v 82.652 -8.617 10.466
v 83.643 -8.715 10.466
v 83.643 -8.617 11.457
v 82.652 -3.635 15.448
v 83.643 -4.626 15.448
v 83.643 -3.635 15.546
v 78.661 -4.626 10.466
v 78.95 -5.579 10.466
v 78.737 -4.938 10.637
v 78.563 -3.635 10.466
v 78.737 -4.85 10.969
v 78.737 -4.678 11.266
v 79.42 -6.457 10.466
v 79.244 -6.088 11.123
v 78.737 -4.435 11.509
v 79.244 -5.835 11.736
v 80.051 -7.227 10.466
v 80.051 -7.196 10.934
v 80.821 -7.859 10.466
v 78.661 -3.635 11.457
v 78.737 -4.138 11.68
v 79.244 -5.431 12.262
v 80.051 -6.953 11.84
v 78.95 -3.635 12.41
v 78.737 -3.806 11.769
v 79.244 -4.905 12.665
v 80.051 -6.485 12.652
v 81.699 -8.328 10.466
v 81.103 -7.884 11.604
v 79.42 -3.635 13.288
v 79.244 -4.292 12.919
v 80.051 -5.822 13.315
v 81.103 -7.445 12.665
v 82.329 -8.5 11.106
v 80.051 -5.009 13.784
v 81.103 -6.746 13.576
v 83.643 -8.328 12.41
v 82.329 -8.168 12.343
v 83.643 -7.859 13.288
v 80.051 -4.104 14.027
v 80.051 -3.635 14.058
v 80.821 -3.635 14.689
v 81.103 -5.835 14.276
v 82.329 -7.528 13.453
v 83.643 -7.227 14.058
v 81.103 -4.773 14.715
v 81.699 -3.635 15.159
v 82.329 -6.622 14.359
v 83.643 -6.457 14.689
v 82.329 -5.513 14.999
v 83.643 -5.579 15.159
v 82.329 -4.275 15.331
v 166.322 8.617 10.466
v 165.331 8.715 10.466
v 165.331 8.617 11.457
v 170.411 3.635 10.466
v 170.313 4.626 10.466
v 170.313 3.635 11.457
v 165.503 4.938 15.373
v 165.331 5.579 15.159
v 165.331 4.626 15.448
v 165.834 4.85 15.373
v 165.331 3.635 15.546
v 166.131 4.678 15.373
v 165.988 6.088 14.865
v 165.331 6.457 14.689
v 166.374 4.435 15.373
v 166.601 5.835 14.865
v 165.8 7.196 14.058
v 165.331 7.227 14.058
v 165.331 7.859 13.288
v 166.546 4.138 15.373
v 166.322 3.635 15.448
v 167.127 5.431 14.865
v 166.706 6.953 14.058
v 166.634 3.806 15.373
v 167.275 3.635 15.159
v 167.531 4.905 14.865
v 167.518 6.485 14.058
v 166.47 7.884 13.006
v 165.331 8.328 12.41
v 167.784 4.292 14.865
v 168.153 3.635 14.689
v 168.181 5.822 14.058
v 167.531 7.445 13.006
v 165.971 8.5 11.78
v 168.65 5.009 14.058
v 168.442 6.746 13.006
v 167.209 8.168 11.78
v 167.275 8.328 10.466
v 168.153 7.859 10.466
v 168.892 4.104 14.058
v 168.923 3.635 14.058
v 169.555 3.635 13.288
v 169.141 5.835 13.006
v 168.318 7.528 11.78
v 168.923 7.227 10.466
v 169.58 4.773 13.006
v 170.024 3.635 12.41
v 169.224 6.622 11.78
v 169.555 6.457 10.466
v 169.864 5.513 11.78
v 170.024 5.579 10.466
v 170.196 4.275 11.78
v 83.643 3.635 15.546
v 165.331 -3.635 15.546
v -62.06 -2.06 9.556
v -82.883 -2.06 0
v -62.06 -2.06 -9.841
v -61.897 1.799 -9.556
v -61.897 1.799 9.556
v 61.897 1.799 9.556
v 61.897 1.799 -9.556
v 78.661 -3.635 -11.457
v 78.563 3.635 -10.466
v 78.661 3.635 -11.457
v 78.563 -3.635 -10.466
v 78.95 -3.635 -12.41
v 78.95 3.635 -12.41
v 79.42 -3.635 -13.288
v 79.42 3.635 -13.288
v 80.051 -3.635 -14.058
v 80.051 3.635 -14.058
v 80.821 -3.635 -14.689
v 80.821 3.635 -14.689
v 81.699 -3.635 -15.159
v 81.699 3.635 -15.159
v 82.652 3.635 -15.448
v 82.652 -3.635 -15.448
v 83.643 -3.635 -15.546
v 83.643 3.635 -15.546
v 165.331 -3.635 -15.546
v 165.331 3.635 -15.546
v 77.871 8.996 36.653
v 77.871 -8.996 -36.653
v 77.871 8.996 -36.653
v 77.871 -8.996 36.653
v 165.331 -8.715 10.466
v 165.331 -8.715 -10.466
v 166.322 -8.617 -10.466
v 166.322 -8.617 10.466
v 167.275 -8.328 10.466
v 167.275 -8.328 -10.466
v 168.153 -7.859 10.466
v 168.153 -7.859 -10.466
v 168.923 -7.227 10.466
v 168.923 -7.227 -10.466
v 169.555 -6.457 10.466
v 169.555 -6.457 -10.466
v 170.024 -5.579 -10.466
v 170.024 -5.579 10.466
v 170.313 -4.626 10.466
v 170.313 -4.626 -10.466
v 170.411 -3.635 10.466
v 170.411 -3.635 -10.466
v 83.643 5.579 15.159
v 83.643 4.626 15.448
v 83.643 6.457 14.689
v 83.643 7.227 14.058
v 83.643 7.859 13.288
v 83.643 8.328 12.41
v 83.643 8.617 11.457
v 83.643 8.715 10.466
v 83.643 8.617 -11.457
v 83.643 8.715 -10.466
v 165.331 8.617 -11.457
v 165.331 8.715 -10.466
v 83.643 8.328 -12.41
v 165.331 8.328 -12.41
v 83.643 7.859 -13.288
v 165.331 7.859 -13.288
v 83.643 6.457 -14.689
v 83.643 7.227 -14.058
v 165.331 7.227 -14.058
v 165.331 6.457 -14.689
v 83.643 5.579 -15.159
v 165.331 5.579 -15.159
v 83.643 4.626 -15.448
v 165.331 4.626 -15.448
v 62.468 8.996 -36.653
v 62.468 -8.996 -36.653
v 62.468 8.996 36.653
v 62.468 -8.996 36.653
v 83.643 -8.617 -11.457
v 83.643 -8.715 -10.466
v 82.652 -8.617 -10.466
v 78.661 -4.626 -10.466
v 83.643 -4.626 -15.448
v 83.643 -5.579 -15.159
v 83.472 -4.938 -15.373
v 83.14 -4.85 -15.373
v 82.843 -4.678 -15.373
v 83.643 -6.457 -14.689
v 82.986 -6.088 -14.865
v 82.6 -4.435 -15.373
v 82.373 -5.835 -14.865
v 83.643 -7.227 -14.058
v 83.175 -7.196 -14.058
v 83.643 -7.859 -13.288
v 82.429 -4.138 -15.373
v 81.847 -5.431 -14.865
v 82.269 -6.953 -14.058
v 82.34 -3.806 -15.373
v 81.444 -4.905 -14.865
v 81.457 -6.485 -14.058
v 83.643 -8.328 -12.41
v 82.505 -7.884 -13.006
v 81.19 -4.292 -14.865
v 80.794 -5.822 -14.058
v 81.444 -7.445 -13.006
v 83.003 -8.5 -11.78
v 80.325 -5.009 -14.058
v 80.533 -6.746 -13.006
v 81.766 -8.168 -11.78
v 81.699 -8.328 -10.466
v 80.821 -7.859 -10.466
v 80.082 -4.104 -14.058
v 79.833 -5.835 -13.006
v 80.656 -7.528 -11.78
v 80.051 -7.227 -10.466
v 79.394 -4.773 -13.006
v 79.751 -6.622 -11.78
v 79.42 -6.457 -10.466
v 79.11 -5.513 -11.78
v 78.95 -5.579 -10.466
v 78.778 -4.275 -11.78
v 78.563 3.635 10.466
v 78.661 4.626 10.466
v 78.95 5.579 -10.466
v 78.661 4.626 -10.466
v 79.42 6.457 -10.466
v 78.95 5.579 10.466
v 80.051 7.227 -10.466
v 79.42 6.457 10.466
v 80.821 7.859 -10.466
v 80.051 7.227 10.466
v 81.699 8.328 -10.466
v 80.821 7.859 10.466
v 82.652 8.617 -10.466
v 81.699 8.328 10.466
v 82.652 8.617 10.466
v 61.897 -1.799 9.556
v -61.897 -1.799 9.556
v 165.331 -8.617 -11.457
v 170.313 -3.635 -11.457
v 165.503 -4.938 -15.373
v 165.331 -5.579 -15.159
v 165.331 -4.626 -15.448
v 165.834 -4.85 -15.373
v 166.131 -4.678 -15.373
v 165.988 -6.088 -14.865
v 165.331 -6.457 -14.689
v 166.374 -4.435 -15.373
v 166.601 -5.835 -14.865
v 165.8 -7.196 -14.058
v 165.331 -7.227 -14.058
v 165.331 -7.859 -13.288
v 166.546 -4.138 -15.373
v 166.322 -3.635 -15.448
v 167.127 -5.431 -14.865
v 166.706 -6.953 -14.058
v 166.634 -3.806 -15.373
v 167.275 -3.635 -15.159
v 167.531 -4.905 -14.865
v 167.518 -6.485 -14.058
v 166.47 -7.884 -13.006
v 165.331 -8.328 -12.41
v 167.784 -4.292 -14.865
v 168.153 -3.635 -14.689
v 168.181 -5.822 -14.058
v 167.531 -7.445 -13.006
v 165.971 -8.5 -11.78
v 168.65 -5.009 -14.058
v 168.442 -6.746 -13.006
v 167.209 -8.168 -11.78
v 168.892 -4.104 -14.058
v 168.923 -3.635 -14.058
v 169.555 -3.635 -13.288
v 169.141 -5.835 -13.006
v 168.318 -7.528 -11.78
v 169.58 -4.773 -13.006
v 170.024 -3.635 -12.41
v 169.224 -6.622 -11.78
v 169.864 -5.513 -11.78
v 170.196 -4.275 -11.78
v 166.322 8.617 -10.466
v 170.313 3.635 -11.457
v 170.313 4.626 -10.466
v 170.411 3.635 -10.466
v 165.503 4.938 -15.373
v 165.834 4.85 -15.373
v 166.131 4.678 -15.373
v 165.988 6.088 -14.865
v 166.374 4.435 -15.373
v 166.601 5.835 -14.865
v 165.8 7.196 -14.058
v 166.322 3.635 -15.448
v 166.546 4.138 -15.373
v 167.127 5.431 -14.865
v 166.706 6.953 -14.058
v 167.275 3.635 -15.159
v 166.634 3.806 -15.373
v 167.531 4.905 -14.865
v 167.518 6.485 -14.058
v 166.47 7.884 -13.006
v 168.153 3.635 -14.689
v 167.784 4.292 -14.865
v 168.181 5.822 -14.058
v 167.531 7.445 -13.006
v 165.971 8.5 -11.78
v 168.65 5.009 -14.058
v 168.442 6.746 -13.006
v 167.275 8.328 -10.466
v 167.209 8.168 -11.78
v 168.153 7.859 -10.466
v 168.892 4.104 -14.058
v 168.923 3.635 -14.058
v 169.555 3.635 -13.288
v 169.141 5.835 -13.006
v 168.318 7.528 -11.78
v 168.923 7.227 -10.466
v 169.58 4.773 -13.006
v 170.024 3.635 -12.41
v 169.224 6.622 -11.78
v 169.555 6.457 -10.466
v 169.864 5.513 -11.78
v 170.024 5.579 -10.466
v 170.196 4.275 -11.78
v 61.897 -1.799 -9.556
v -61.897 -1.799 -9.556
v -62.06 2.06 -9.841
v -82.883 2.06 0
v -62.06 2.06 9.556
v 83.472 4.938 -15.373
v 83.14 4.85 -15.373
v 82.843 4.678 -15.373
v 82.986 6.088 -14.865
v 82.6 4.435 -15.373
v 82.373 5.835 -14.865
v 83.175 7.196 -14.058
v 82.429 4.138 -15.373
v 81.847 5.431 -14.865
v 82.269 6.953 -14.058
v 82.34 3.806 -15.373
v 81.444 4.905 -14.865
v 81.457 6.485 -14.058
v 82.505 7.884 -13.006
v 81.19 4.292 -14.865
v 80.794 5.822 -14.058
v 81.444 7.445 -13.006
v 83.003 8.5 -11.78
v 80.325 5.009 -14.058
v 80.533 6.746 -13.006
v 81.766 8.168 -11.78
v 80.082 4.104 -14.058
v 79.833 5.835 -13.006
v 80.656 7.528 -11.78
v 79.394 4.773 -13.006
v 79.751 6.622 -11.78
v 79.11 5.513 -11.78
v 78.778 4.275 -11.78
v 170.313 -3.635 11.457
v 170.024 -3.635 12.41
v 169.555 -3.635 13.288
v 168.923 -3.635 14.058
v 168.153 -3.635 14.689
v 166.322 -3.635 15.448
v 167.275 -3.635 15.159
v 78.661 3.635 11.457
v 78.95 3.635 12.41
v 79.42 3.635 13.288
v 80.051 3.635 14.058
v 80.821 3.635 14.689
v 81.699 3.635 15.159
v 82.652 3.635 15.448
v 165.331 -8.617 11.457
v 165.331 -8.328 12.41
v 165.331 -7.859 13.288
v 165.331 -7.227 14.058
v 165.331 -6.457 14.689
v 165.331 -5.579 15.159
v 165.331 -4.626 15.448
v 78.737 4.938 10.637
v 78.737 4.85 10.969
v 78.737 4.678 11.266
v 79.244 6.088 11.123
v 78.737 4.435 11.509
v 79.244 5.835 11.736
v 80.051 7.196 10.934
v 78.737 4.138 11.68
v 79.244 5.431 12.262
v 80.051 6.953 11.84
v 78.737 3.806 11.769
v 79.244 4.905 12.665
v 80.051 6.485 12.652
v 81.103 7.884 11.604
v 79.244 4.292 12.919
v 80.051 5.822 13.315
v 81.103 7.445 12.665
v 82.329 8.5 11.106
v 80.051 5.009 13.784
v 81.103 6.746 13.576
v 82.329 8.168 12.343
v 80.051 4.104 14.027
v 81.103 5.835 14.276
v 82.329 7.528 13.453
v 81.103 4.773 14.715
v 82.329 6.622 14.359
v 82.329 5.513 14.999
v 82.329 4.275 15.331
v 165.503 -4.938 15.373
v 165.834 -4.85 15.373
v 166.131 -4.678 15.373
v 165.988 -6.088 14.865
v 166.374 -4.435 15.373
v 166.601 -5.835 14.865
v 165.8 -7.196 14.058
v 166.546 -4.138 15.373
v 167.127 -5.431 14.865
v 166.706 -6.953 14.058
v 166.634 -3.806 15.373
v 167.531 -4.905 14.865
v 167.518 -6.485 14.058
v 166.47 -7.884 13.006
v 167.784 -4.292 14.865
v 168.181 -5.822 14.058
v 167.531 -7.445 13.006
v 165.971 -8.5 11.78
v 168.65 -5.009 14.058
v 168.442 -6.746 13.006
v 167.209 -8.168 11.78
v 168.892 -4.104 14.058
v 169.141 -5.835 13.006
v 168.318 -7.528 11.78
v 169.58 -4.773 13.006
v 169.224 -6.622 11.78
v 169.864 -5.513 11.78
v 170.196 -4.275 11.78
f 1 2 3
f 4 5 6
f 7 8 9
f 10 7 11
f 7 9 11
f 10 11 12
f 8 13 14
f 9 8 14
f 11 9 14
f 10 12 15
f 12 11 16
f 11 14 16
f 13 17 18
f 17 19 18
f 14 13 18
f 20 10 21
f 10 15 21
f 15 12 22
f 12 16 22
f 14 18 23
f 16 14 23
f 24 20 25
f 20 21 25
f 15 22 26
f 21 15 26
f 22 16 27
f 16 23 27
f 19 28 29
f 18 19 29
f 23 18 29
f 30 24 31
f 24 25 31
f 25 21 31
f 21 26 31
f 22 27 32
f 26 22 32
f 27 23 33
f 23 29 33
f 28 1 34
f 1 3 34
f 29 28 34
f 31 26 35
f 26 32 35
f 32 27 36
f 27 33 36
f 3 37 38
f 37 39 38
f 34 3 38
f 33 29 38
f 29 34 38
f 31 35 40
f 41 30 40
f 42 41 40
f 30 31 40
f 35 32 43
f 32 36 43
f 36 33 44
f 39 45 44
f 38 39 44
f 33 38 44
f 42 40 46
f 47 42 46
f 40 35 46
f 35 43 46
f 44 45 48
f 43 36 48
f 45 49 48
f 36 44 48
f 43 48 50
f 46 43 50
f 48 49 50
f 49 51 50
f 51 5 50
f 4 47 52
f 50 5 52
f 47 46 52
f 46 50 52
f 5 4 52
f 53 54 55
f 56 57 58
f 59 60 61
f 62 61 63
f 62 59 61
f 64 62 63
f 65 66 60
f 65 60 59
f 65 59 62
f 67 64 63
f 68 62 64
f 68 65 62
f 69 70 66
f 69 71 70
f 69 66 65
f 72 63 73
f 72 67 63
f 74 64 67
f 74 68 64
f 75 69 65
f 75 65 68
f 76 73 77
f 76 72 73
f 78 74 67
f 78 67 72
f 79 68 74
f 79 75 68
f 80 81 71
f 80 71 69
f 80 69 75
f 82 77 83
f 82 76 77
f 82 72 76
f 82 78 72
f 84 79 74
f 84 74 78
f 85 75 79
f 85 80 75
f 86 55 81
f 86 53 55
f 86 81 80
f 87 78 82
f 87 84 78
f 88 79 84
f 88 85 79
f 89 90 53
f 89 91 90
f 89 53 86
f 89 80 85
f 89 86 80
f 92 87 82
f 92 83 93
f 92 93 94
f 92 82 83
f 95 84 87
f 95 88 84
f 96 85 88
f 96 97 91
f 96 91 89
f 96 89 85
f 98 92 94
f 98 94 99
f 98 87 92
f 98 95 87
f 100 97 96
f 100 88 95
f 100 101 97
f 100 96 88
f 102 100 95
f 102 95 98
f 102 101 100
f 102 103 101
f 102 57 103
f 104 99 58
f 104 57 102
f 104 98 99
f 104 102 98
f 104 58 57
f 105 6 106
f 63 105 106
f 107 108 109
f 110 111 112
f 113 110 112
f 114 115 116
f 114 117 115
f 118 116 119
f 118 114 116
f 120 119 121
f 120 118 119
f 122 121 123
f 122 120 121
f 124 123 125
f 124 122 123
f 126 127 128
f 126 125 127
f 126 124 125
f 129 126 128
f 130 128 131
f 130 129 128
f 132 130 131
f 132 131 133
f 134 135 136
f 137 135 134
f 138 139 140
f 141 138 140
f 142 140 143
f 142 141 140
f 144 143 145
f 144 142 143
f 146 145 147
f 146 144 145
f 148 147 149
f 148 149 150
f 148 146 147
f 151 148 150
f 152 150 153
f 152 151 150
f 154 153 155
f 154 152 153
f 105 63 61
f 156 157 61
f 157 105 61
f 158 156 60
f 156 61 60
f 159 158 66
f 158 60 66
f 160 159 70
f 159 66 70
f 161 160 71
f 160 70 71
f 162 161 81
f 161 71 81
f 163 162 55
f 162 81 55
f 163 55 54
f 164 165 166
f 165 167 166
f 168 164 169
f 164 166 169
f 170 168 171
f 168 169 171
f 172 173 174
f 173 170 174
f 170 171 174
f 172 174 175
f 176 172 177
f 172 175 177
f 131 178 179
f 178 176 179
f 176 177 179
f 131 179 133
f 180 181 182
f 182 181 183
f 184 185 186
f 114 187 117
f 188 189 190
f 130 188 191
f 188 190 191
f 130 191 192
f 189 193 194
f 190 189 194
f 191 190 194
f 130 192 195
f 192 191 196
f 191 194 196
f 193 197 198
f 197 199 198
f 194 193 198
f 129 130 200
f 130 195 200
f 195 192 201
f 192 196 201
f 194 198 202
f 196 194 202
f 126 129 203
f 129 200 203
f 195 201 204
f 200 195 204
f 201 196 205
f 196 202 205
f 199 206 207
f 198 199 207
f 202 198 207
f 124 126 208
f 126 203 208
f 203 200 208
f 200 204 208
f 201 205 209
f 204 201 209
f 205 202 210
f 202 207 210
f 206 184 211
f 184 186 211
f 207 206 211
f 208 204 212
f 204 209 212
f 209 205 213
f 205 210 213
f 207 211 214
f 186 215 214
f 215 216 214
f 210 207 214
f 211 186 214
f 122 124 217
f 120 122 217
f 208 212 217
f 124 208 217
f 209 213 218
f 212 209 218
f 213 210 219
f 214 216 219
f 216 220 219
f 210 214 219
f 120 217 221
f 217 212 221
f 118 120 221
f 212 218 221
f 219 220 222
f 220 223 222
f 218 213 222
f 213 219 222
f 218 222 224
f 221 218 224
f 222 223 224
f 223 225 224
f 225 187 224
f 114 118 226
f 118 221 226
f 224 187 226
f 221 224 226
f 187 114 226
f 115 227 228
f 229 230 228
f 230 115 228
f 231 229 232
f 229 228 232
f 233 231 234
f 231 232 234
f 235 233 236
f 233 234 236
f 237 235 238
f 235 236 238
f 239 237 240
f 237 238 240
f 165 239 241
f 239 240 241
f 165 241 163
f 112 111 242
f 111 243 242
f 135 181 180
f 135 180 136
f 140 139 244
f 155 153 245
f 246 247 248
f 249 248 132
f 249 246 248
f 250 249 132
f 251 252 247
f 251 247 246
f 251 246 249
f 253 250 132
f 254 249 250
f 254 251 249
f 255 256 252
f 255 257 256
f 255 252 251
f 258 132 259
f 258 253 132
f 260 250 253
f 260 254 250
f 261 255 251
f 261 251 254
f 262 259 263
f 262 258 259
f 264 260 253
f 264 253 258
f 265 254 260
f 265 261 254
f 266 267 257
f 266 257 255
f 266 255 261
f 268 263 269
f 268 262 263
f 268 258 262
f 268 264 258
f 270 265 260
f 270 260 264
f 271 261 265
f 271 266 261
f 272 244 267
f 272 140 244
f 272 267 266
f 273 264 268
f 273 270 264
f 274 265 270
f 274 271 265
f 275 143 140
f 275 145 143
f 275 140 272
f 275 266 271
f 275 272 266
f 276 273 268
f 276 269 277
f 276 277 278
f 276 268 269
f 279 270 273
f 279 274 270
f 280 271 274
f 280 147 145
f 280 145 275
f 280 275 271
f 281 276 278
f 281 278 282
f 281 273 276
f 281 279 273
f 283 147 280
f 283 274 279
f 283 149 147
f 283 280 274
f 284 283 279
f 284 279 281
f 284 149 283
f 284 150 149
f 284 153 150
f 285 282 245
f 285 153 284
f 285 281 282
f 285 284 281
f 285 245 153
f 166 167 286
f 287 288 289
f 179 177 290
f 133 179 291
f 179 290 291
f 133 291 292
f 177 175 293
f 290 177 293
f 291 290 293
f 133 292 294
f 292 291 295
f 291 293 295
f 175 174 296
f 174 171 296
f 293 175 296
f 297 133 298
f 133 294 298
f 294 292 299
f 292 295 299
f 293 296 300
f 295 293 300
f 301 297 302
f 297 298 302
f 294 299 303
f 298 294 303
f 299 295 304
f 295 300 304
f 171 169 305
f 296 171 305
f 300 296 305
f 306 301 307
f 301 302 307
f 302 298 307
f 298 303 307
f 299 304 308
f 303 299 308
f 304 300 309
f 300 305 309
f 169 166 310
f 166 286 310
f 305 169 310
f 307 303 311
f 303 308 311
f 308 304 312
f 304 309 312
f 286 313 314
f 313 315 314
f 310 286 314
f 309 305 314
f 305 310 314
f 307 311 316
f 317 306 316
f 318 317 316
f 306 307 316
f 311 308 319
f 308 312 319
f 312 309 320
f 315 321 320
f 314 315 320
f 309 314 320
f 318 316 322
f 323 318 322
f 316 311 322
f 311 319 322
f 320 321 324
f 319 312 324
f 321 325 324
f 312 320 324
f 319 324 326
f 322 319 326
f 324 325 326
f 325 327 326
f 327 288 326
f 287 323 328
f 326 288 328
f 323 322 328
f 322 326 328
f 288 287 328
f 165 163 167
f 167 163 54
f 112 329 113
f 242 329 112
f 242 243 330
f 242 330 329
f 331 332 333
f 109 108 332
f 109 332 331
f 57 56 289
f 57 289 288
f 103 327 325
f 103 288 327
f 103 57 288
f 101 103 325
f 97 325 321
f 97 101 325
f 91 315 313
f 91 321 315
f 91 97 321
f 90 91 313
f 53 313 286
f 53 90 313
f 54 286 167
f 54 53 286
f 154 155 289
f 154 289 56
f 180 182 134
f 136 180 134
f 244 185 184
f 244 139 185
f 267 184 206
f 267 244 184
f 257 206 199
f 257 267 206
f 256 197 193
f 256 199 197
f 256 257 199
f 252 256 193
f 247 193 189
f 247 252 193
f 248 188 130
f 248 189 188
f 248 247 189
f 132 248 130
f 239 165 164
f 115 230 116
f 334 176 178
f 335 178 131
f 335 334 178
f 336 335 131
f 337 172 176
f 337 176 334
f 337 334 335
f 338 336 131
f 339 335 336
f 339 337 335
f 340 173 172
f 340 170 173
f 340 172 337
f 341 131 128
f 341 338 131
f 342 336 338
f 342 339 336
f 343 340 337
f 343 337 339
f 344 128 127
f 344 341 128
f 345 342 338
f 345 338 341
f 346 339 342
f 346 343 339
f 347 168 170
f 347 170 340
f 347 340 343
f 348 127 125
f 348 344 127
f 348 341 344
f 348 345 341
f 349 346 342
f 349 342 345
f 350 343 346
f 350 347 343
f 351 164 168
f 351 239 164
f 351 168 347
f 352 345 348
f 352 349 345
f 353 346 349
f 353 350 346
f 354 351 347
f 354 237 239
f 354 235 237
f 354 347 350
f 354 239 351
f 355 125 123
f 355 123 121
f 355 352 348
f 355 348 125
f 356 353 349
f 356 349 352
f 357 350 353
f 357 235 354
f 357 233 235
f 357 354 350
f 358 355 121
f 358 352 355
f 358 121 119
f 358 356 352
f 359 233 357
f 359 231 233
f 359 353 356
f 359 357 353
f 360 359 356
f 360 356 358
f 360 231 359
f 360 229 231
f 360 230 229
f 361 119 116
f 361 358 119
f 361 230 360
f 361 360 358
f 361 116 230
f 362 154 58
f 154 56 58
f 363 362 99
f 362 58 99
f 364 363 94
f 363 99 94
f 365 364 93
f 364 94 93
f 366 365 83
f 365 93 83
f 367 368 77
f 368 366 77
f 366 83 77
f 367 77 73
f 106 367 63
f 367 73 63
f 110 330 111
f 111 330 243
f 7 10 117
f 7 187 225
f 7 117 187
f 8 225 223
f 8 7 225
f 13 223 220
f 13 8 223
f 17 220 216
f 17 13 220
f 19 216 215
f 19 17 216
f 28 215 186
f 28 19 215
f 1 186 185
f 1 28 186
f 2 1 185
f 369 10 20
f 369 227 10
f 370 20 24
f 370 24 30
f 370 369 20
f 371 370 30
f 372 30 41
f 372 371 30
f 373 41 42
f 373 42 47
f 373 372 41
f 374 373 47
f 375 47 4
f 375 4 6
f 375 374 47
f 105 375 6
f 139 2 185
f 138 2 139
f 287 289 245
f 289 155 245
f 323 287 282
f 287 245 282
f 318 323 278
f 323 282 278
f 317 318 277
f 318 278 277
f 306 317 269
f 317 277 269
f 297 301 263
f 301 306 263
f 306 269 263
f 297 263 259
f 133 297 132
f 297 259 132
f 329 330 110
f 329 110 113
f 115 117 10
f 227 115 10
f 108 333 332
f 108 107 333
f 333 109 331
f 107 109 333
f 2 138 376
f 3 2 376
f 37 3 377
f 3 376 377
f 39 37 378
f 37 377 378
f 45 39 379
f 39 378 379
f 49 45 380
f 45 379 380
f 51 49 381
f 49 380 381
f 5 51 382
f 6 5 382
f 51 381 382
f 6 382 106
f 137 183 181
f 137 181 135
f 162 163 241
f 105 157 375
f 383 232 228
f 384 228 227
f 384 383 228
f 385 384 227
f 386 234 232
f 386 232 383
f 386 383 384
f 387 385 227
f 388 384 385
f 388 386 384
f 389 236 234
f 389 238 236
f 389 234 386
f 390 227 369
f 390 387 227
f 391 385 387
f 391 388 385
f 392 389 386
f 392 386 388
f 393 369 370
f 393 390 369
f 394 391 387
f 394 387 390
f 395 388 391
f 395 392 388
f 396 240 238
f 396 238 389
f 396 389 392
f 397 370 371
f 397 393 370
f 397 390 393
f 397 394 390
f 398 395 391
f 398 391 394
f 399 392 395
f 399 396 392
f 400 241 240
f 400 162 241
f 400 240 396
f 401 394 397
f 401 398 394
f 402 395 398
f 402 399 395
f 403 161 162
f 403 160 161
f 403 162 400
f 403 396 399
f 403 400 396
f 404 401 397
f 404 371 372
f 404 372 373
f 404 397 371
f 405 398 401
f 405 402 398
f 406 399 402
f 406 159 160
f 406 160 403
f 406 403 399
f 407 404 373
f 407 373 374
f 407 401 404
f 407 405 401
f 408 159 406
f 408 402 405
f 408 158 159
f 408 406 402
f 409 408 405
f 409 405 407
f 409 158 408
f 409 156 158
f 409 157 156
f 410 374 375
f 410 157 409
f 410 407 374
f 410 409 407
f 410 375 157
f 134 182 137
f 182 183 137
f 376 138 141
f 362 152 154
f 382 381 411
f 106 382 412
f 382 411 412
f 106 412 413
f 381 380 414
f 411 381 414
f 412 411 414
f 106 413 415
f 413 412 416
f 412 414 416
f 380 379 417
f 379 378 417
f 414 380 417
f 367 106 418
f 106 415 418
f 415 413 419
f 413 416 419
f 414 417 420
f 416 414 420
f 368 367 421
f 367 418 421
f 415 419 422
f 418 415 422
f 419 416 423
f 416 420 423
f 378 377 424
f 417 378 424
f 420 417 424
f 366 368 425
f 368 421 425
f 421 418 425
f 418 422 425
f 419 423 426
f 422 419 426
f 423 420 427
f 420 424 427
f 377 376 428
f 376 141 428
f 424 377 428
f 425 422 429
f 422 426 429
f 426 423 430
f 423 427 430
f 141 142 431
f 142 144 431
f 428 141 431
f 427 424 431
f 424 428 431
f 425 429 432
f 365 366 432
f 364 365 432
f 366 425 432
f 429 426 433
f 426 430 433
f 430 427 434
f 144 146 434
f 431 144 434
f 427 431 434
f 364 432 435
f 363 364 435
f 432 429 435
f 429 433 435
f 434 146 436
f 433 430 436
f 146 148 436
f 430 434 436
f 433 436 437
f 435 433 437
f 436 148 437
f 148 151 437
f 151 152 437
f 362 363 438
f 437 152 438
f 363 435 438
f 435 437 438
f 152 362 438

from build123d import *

# Parameters (mm, degrees)
F4_DEPTH = 2.06025
F1_W     = 15.403003
F1_H     = 73.306844
F5_DEPTH = 8.99555
F0_W     = 123.794444
F0_H     = 19.111122
F6_DEPTH = 1.79919
F3_W     = 91.847494
F3_H     = 31.09123
F7_DEPTH = 8.71483
F8_R     = 5.08


with BuildPart() as f4:
    # F2 (on Front) → F4 (new body, symmetric)
    with BuildSketch(Plane.XZ):
        Polygon((-62.060211, 9.555561), (-82.882777, 0), (-62.060211, -9.840802), align=None)
    extrude(amount=F4_DEPTH, both=True)


with BuildPart() as f5:
    # F1 (on Front) → F5 (new body, symmetric)
    with BuildSketch(Plane.XZ):
        with Locations((70.169196, 0)):
            Rectangle(F1_W, F1_H)
    extrude(amount=F5_DEPTH, both=True)


with BuildPart() as f6:
    # F0 (on Front) → F6 (new body, symmetric)
    with BuildSketch(Plane.XZ):
        Rectangle(F0_W, F0_H)
    extrude(amount=F6_DEPTH, both=True)


with BuildPart() as f7:
    # F3 (on Front) → F7 (new body, symmetric)
    with BuildSketch(Plane.XZ):
        with Locations((124.487169, 0)):
            Rectangle(F3_W, F3_H)
    extrude(amount=F7_DEPTH, both=True)

    # F8
    f8_edges = [f7.edges().sort_by_distance(p)[0] for p in [
        (170.410916, -8.71483, 0),
        (124.487169, -8.71483, 15.545615),
        (78.563422, -8.71483, 0),
        (124.487169, -8.71483, -15.545615),
        (170.410916, 8.71483, 0),
        (124.487169, 8.71483, 15.545615),
        (78.563422, 8.71483, 0),
        (124.487169, 8.71483, -15.545615),
        (170.410916, 0, 15.545615),
        (78.563422, 0, 15.545615),
        (170.410916, 0, -15.545615),
        (78.563422, 0, -15.545615),
    ]]
    fillet(f8_edges, radius=F8_R)


solid = Compound([f4.part, f5.part, f6.part, f7.part])
